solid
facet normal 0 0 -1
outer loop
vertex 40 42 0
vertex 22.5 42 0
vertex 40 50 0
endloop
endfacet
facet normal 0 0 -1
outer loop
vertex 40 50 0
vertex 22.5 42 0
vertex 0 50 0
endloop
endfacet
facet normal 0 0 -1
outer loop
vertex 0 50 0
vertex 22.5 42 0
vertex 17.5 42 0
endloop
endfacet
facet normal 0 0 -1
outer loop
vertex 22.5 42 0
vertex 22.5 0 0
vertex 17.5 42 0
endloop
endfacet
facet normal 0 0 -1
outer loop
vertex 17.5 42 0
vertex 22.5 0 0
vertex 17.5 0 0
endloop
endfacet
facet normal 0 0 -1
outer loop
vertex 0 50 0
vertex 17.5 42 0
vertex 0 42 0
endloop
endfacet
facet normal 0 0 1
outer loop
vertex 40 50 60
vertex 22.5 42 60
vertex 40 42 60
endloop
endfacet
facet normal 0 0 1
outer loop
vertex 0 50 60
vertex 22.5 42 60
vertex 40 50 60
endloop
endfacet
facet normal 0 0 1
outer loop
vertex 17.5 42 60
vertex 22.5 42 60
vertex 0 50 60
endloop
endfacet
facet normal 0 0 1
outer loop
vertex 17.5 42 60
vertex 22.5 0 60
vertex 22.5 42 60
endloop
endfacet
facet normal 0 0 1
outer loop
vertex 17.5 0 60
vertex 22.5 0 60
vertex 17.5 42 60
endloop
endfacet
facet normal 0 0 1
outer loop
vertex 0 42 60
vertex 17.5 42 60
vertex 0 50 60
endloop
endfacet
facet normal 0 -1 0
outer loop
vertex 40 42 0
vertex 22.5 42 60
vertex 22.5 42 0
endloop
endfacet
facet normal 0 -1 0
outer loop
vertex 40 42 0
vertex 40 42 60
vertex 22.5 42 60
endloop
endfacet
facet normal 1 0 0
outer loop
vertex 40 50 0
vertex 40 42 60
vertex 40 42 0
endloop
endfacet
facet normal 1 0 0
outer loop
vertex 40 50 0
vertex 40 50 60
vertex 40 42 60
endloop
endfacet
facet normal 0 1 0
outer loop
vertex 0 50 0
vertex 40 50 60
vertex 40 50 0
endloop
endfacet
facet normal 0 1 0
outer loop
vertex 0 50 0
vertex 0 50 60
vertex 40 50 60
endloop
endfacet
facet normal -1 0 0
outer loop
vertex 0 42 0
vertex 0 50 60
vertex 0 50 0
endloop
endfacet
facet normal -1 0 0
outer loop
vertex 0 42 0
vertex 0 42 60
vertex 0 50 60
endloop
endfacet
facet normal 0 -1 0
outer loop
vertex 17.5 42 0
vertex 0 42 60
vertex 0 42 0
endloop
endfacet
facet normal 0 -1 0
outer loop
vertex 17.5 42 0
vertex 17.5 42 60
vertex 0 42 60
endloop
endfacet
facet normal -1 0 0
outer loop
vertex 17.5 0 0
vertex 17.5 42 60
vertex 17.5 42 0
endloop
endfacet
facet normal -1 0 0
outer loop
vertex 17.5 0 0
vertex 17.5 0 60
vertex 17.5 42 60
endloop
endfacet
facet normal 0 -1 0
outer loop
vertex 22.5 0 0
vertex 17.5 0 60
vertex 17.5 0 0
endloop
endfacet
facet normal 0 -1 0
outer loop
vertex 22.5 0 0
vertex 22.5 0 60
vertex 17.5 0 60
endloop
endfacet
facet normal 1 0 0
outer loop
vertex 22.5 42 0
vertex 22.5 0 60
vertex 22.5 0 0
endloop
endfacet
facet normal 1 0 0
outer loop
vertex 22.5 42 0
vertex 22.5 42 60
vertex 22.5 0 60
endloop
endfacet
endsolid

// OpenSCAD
$fn = 32;

// ----------------------------------------------------------------------
// Structural section: tee 40 x 50 mm
// ----------------------------------------------------------------------

// --- parameters (mm) ---
sec_w = 40;               // tee width, X
sec_h = 50;               // tee height, Y
flange_t = 8;             // top flange thickness
web_t = 5;                // web thickness
plate_t = 60;             // cut length, Z (extrusion height)
fit_tol = 0.1;            // declared fit tolerance (prompt contract)
free_tol = 0.3;           // declared free tolerance (prompt contract)

profile = [[17.5, 0], [22.5, 0], [22.5, 42], [40, 42], [40, 50], [0, 50], [0, 42], [17.5, 42]];  // primary outline, 8 points, counter clockwise

// --- the one profile operation ---
linear_extrude(height = plate_t) polygon(points = profile);
